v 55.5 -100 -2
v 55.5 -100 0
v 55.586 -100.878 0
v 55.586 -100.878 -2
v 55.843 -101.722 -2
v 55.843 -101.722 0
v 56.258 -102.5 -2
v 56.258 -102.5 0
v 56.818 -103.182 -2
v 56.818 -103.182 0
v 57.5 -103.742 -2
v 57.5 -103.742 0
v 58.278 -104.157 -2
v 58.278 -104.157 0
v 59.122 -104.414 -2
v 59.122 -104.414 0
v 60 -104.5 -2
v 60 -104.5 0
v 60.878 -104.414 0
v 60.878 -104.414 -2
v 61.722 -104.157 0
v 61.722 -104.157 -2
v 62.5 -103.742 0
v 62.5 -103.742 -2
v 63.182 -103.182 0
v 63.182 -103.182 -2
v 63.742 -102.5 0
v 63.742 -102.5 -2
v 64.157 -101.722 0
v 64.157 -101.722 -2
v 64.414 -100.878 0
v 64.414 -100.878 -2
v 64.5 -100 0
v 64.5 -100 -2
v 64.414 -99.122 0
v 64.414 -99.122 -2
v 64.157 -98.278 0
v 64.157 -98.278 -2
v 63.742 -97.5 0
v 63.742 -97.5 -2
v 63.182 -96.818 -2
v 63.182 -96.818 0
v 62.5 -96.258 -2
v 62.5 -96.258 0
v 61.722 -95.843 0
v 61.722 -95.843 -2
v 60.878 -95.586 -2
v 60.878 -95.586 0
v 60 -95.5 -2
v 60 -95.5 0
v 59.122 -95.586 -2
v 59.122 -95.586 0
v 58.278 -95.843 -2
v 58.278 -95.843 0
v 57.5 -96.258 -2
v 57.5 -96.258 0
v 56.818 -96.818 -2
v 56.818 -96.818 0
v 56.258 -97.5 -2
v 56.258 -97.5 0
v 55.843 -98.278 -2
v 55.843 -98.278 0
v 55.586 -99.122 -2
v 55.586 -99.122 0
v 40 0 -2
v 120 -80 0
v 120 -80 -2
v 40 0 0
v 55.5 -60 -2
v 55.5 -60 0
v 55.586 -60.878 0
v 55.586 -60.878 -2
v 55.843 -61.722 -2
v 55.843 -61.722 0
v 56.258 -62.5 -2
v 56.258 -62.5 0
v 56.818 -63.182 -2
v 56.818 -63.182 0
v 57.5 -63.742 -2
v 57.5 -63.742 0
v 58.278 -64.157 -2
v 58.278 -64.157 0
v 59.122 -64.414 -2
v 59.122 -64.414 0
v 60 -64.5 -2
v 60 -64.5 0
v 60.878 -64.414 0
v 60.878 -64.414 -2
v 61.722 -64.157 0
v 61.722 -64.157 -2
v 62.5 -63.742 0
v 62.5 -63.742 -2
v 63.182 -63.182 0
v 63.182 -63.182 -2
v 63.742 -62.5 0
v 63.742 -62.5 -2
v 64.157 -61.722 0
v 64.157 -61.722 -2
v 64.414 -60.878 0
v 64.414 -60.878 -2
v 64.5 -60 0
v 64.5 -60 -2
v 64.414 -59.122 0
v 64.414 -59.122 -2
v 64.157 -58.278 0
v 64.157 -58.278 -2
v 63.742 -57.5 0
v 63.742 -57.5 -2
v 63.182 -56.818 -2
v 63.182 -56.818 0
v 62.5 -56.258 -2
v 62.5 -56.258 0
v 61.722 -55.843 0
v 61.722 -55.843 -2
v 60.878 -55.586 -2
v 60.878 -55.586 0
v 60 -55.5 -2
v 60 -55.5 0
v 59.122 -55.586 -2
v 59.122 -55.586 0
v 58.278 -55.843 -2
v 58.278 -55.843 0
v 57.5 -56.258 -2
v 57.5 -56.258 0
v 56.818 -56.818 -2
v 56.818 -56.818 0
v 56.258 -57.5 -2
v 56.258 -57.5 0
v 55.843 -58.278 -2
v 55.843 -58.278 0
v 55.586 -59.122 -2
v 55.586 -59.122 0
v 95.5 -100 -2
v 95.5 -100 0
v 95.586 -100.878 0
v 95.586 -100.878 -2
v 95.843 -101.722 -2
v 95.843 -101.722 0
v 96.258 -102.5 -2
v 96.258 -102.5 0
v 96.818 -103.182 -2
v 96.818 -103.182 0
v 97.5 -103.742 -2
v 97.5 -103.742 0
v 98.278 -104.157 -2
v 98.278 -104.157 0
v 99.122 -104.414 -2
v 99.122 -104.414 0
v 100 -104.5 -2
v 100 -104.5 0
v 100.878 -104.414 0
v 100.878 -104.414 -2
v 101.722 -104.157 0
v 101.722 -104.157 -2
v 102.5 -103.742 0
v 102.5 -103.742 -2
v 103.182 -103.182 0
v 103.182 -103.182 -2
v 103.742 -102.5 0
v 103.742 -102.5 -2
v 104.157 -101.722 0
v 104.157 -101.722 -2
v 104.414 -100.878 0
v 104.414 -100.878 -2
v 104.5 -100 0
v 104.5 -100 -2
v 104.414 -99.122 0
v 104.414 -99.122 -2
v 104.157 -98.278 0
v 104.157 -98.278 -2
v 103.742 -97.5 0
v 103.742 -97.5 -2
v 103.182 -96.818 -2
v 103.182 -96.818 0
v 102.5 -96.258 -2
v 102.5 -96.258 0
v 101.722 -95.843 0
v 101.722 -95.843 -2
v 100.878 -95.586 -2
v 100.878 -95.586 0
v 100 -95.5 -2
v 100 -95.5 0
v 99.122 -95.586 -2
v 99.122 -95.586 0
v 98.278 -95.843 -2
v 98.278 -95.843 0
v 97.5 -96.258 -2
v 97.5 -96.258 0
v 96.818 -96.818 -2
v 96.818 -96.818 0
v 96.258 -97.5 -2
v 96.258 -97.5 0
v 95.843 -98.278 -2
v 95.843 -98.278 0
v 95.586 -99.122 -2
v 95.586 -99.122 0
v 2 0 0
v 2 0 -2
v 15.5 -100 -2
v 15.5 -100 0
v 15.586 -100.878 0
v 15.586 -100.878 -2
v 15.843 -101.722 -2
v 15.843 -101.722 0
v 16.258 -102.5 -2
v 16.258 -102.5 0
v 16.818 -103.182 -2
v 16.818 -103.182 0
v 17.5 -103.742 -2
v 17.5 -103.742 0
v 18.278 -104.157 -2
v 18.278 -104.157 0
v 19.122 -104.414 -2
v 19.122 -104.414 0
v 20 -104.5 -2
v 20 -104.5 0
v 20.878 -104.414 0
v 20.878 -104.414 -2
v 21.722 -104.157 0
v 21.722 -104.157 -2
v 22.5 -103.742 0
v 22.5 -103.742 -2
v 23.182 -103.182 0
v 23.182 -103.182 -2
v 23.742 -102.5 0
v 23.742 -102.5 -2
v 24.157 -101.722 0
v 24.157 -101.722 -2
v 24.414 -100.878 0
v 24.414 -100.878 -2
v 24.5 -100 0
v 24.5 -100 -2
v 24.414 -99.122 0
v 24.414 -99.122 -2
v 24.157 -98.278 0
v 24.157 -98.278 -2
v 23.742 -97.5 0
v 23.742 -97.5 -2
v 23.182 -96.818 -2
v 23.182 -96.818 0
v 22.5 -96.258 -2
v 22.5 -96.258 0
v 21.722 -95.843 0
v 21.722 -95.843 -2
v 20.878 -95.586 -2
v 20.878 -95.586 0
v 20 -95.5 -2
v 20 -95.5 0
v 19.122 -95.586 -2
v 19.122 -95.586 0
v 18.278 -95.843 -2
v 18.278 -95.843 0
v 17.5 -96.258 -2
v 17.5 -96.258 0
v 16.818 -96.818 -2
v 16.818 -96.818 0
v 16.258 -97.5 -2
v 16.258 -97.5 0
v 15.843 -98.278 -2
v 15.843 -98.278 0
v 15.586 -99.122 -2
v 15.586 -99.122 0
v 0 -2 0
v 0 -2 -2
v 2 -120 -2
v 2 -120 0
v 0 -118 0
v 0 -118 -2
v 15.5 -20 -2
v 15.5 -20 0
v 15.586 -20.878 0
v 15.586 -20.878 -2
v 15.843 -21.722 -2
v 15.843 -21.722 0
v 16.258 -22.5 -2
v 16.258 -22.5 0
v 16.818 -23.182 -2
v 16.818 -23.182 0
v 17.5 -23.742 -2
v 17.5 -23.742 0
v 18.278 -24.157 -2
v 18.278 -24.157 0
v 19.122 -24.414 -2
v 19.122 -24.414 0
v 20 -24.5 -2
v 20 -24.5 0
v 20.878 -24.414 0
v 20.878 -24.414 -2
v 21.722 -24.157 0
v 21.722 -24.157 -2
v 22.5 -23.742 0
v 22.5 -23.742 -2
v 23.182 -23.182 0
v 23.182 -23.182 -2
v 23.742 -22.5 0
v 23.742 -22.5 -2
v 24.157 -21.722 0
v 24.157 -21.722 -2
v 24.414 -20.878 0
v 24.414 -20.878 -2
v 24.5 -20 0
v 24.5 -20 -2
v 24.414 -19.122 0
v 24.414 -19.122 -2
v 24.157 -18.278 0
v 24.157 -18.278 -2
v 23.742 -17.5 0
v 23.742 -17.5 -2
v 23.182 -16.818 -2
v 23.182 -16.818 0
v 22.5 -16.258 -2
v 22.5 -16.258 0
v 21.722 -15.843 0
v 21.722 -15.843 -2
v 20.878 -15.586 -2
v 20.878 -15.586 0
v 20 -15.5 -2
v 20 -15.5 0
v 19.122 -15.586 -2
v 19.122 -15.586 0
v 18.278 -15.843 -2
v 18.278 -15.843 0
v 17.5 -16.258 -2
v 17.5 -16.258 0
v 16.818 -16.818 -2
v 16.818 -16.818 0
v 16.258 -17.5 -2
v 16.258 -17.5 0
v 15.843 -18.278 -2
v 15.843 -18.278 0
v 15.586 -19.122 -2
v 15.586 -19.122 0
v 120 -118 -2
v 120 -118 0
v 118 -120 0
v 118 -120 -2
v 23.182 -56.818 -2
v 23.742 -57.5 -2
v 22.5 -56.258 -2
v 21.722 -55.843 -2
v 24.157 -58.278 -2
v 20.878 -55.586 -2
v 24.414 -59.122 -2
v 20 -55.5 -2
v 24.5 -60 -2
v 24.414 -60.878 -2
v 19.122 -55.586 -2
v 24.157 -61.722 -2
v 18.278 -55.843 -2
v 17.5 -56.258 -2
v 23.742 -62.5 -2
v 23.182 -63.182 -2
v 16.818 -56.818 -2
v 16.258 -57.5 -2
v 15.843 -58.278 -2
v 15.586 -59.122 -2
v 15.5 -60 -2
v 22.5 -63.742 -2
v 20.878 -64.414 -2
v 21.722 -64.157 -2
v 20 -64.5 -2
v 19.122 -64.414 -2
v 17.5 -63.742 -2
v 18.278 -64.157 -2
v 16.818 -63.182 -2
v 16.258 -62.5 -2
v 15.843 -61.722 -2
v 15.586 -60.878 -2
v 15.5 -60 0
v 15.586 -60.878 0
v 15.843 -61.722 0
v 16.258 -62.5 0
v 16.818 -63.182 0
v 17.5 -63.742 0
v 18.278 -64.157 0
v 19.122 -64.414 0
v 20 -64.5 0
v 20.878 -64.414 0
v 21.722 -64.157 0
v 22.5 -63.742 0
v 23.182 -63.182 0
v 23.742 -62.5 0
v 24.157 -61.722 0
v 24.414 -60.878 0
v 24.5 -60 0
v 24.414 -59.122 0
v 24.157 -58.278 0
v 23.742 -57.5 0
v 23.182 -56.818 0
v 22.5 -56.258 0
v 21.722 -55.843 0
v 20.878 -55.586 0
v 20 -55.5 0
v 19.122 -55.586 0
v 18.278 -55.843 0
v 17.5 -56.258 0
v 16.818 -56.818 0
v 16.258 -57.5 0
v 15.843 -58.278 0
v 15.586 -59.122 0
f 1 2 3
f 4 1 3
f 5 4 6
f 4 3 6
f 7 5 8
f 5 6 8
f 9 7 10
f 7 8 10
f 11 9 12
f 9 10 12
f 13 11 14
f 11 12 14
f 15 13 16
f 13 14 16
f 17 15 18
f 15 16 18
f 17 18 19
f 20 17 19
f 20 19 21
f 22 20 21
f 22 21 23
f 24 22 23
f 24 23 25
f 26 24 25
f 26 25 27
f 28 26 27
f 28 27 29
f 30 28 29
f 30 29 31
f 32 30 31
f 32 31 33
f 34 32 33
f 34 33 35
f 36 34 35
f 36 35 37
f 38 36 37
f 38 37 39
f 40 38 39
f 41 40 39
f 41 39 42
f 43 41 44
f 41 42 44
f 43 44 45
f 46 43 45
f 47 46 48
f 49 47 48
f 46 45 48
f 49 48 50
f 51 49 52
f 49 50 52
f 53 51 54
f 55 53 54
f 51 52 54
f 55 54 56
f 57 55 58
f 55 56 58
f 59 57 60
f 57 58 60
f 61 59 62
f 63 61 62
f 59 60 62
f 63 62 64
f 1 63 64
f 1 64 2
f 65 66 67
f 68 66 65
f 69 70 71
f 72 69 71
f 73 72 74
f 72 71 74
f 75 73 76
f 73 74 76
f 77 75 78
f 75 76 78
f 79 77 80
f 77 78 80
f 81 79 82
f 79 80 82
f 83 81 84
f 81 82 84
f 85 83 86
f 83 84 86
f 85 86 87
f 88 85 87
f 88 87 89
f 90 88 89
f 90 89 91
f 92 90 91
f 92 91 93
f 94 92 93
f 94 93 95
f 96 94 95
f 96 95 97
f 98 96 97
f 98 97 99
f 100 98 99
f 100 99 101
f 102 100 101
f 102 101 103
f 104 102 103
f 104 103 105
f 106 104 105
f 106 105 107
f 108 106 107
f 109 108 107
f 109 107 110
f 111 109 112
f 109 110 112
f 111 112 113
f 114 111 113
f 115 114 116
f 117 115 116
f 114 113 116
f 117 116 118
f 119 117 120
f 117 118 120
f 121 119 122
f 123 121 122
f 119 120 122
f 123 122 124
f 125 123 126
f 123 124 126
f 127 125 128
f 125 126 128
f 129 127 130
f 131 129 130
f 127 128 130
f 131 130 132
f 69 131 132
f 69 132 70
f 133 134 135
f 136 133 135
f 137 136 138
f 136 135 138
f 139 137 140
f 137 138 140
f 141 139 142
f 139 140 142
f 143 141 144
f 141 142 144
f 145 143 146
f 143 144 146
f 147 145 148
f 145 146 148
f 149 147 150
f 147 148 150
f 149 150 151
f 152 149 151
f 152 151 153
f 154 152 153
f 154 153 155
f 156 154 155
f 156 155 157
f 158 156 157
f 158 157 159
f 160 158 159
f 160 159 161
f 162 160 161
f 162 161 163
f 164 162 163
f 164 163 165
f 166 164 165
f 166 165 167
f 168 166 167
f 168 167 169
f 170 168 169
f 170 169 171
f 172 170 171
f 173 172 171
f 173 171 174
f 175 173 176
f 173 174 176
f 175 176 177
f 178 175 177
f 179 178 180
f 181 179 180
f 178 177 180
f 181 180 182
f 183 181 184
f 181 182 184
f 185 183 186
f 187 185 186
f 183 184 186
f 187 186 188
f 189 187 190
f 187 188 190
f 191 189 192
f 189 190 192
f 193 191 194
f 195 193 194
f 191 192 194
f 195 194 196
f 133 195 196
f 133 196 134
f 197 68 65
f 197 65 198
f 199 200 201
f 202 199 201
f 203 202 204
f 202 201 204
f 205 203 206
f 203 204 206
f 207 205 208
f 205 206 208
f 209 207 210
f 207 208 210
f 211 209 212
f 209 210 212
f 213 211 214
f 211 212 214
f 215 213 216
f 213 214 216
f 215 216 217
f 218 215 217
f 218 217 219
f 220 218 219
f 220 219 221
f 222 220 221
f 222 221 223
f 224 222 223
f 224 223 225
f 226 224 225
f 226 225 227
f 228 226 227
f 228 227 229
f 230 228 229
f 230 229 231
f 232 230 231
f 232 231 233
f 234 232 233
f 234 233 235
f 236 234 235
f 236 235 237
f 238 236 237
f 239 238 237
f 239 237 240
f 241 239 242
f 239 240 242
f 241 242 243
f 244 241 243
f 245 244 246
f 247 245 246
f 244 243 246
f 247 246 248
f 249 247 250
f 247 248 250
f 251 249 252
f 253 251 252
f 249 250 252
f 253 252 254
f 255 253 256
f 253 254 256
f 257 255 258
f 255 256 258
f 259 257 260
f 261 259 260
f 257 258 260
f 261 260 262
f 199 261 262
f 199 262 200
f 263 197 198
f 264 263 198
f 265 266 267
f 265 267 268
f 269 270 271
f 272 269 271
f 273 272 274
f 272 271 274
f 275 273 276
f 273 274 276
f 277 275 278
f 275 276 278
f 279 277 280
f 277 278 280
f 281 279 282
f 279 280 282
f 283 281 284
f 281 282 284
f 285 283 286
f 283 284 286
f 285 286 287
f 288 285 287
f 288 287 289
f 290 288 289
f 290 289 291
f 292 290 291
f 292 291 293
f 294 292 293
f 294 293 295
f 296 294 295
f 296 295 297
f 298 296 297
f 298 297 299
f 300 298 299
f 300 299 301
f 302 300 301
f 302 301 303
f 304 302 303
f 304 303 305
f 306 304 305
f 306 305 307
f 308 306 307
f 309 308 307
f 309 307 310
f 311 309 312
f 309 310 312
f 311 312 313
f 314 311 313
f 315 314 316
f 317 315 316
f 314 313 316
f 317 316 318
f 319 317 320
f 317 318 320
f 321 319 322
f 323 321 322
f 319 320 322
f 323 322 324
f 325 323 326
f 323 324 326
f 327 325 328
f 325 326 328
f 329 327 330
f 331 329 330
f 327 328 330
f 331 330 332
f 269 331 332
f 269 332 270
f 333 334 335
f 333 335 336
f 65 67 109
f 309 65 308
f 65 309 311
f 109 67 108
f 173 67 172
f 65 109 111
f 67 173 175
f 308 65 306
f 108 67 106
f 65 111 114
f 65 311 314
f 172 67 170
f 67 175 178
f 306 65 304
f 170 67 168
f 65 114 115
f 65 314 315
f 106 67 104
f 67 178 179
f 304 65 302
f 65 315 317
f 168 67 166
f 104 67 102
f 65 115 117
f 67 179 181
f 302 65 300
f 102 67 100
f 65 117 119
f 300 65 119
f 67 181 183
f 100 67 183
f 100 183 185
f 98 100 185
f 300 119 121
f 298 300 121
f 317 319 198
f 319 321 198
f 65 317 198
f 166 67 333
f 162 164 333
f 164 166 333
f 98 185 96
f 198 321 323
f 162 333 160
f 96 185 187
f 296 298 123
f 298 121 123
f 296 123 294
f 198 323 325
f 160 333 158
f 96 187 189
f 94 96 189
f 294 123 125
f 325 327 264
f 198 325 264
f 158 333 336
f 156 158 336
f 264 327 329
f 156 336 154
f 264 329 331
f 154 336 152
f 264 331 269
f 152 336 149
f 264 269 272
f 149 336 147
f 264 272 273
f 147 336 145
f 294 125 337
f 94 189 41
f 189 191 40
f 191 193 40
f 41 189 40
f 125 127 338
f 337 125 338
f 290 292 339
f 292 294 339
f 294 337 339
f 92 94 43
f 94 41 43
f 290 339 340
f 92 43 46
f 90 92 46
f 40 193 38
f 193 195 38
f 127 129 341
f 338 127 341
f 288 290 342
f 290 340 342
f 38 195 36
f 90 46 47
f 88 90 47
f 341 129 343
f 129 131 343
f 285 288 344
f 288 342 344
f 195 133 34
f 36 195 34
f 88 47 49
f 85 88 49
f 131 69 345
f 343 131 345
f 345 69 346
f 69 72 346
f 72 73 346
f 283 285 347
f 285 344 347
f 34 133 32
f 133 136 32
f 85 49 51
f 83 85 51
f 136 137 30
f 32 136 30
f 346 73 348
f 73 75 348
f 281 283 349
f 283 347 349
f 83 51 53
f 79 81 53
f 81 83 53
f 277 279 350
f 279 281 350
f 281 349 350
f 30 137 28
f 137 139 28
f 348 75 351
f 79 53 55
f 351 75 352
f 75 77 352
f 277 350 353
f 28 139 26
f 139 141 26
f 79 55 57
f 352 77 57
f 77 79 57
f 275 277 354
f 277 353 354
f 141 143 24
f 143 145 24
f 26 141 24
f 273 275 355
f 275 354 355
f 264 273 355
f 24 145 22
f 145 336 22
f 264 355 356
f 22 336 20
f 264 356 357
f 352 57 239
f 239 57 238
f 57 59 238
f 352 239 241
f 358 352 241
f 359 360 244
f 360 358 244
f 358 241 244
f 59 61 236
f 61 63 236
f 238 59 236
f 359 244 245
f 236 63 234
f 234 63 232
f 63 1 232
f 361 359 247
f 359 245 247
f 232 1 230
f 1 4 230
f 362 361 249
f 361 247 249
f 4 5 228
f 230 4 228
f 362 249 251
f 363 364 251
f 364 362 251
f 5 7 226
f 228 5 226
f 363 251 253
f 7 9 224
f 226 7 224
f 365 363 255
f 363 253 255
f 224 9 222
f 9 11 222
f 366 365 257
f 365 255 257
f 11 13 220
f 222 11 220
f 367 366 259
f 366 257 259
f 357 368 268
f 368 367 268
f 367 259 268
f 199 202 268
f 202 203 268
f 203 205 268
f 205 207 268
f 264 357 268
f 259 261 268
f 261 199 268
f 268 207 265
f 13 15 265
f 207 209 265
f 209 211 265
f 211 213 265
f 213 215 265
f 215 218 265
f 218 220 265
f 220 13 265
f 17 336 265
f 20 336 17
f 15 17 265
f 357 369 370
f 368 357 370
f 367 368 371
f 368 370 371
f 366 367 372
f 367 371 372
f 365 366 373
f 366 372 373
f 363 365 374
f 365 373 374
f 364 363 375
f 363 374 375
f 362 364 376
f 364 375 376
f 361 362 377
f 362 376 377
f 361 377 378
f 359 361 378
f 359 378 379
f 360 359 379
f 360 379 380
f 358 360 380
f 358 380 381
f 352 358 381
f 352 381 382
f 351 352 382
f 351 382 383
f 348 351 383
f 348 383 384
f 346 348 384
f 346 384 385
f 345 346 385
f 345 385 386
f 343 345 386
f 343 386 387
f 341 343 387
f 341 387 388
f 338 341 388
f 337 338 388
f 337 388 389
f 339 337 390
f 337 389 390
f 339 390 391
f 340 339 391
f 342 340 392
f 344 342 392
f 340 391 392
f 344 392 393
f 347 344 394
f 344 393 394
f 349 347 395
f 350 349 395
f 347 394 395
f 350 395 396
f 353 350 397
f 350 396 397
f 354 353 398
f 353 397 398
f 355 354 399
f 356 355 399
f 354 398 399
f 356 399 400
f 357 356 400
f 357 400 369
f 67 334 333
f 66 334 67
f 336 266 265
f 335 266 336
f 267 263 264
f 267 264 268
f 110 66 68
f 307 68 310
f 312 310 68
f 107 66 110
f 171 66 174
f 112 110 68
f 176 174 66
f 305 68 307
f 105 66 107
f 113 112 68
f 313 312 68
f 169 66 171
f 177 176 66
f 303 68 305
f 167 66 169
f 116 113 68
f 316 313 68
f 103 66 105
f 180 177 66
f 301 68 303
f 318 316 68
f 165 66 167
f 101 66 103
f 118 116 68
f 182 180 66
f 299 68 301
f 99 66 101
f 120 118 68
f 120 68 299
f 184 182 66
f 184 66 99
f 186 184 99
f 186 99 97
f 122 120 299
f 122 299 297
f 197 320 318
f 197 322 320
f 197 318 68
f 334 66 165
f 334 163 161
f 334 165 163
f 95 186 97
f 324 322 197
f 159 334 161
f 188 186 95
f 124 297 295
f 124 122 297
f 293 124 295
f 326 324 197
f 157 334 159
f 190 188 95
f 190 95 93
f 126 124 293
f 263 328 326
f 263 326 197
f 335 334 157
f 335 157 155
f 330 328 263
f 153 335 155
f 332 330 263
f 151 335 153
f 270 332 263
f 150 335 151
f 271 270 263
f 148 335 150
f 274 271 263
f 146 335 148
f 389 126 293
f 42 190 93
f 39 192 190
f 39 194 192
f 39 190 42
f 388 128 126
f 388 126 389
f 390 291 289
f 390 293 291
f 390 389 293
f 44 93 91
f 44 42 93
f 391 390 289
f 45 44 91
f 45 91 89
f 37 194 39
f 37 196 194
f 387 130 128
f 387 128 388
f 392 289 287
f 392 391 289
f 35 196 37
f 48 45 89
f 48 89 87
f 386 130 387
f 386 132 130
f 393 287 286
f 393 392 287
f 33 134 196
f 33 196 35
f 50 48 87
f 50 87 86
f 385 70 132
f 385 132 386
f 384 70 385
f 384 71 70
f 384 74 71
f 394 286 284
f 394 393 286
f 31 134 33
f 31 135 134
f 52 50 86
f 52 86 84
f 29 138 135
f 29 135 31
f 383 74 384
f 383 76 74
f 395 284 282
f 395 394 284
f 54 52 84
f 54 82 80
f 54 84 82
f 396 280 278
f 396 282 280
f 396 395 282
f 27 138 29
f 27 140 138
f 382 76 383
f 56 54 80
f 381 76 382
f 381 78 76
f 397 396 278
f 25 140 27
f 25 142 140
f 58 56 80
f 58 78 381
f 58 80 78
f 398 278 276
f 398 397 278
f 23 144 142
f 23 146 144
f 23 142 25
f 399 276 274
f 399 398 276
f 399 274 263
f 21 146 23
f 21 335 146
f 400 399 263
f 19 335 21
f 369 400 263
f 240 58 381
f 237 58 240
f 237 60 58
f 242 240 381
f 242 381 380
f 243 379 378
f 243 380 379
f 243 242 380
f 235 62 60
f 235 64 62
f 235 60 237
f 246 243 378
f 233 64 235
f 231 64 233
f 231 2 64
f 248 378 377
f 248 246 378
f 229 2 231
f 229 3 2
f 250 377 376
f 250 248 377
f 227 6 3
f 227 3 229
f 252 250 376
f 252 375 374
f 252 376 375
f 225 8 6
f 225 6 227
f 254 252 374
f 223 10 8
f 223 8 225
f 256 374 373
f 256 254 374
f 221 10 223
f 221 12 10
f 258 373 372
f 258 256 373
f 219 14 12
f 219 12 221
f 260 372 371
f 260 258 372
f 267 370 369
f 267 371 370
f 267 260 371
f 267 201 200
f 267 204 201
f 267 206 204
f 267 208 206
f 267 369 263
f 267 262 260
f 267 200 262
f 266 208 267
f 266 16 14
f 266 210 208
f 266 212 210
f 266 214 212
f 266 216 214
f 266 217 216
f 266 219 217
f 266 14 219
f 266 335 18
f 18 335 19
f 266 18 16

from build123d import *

# Parameters (mm, degrees)
EXTRUDE_1_DEPTH   = 2
HOLE_WIZARD_M81_D = 9
CHAMFER_1_SIZE    = 2


with BuildPart() as part:
    # Эскиз1 → Бобышка-Вытянуть1 (new body)
    with BuildSketch(Plane(origin=(0, 0, 0), x_dir=(1, 0, 0), z_dir=(0, 0, -1))):
        Polygon((0, 0), (0, 120), (120, 120), (120, 80), (40, 0), align=None)
    extrude(amount=EXTRUDE_1_DEPTH)

    # Отверстие с зазором M81 (through all)
    with Locations(Plane(origin=(0, 0, -2), x_dir=(1, 0, 0), z_dir=(0, 0, -1))):
        with Locations((60, 100), (20, 100), (20, 60), (20, 20), (100, 100), (60, 60)):
            Hole(HOLE_WIZARD_M81_D / 2)

    # Фаска1
    chamfer_1_edges = [part.edges().sort_by_distance(p)[0] for p in [
        (0, 0, -1),
        (0, -120, -1),
        (120, -120, -1),
    ]]
    chamfer(chamfer_1_edges, length=CHAMFER_1_SIZE)


solid = part.part
